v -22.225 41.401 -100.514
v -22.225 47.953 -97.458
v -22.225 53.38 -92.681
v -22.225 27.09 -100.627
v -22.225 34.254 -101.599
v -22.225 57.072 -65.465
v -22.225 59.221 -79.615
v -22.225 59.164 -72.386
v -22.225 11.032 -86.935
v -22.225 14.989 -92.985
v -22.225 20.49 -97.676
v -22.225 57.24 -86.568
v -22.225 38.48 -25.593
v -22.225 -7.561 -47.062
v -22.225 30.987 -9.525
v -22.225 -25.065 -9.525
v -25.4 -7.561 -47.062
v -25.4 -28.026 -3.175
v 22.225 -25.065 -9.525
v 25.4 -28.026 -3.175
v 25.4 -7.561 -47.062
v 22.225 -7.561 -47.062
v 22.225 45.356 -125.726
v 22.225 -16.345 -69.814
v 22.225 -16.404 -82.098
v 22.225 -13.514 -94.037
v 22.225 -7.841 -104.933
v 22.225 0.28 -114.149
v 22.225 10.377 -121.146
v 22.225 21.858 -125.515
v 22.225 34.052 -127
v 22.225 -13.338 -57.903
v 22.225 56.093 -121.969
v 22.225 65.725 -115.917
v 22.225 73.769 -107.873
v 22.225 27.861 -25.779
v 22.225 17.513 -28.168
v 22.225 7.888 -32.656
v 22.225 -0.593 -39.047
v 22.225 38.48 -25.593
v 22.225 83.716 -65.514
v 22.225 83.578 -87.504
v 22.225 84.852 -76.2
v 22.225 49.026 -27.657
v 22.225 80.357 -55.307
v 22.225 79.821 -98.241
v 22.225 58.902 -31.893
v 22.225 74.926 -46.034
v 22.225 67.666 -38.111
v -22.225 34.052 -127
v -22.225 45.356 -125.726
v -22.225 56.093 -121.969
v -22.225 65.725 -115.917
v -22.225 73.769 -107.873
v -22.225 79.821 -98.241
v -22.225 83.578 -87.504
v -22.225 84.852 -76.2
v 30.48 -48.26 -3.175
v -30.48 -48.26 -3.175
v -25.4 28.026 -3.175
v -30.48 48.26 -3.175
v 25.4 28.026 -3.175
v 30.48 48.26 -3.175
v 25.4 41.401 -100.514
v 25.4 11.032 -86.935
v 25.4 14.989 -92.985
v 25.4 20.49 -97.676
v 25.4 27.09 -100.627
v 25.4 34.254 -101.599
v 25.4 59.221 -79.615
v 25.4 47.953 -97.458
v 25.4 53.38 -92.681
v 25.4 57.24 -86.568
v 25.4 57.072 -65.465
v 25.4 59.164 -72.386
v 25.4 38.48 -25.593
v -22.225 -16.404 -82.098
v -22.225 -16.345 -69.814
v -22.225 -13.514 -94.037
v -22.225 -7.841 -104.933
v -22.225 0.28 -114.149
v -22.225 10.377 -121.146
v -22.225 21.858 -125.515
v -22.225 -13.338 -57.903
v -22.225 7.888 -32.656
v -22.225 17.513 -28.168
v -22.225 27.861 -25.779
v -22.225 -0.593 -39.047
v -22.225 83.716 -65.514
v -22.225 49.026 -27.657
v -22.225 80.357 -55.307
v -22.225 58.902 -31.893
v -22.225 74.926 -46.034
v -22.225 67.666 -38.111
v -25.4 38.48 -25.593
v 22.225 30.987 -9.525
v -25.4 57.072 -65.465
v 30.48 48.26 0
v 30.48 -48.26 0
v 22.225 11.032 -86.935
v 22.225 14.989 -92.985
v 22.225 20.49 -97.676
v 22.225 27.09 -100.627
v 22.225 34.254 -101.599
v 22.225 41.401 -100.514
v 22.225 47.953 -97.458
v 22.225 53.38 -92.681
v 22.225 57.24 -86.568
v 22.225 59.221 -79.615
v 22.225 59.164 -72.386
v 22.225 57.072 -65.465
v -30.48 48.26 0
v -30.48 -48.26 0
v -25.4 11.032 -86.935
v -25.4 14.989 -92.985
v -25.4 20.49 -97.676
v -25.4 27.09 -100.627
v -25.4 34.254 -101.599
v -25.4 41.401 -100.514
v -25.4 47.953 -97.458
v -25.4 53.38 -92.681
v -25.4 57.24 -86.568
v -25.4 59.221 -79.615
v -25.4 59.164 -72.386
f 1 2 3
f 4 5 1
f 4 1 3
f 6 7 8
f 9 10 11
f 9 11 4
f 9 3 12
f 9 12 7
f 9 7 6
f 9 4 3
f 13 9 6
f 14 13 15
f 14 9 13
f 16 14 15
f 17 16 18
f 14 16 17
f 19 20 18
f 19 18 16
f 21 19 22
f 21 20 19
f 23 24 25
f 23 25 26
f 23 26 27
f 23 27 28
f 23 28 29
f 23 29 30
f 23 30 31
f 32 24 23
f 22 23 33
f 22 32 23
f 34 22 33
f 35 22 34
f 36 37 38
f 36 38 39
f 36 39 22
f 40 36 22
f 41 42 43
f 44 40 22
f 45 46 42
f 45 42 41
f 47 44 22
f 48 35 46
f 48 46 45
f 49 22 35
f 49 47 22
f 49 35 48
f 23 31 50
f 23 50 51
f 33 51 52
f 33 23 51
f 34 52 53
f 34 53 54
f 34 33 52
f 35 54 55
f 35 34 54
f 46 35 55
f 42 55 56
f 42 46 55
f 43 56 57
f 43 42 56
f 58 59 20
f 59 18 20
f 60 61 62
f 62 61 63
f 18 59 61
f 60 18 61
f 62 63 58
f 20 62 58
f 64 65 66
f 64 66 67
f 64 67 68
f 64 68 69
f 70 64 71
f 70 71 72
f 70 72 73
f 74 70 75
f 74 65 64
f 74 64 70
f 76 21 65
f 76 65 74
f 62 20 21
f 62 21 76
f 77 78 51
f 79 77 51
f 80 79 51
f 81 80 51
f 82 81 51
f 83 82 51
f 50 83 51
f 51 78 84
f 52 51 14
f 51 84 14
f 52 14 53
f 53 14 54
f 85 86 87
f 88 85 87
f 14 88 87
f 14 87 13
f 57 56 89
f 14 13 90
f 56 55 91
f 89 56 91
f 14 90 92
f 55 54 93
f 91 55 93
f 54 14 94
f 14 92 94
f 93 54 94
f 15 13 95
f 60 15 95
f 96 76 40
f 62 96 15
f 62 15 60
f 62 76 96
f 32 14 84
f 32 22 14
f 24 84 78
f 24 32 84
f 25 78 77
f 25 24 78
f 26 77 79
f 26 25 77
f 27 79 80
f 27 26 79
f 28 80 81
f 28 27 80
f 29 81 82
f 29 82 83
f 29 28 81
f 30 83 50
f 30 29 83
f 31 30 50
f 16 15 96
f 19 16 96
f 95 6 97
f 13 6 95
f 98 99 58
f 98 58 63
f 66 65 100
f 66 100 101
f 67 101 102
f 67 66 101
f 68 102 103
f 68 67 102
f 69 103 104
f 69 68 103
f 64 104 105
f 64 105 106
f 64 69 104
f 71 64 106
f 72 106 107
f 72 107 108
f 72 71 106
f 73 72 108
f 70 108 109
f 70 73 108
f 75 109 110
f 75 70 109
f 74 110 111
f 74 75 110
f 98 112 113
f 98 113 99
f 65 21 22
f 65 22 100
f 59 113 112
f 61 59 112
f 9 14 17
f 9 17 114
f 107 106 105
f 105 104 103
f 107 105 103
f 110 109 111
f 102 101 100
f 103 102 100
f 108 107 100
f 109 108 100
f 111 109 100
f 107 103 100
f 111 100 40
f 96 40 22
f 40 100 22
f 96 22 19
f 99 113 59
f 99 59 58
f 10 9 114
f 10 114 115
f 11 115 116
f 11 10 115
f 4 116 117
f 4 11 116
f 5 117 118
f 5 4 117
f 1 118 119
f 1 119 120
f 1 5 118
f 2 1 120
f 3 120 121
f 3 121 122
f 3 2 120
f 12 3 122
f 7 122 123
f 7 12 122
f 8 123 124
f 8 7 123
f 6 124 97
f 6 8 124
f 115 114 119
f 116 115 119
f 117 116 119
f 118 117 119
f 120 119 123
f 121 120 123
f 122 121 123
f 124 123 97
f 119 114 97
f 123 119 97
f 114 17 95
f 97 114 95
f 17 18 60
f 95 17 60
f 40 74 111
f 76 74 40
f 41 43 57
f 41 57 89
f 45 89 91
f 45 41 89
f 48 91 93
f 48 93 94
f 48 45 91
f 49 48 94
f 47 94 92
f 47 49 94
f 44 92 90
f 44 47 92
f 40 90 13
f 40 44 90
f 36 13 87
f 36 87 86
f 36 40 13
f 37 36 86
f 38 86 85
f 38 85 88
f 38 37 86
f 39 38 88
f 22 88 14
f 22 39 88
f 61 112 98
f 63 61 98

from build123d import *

# Parameters (mm, degrees)
F0_W     = 60.96
F0_H     = 96.52
F1_DEPTH = 3.175
F3_DEPTH = 25.4
F4_W     = 44.45
F4_H     = 101.6
F5_DEPTH = 107.713117
F6_DEPTH = 22.225


with BuildPart() as f1:
    # F0 (on Top) → F1 (new body)
    with BuildSketch(Plane.XY):
        Rectangle(F0_W, F0_H)
    extrude(amount=-F1_DEPTH)

    # F2 (on Right) → F3 (join, symmetric)
    with BuildSketch(Plane.YZ):
        with BuildLine():
            Line((-28.025799, -3.175), (-7.560807, -47.062317))
            ThreePointArc((-7.560807, -47.062317), (12.583109, -30.159564), (38.479628, -25.593309))
            Line((38.479628, -25.593309), (28.025799, -3.175))
            Line((28.025799, -3.175), (-28.025799, -3.175))
        make_face()
        with BuildLine():
            ThreePointArc((38.479628, -25.593309), (12.583109, -30.159564), (-7.560807, -47.062317))
            Line((-7.560807, -47.062317), (11.031899, -86.934504))
            ThreePointArc((11.031899, -86.934504), (44.786621, -99.220218), (57.072335, -65.465496))
            Line((57.072335, -65.465496), (38.479628, -25.593309))
        make_face()
    extrude(amount=F3_DEPTH, both=True)

    # F4 (on face) → F5 (cut, through all)
    with BuildSketch(Plane.XZ.offset(48.26)):
        with Locations((0, -60.325)):
            Rectangle(F4_W, F4_H)
    extrude(amount=-F5_DEPTH, mode=Mode.SUBTRACT)


with BuildPart() as f6:
    # F2 (on Right) → F6 (new body, symmetric)
    with BuildSketch(Plane.YZ):
        with BuildLine():
            ThreePointArc((-7.560807, -47.062317), (-11.008034, -99.65683), (34.052117, -127))
            ThreePointArc((34.052117, -127), (69.973141, -112.121024), (84.852117, -76.2))
            ThreePointArc((84.852117, -76.2), (71.505805, -41.880017), (38.479628, -25.593309))
            Line((38.479628, -25.593309), (57.072335, -65.465496))
            ThreePointArc((57.072335, -65.465496), (44.786621, -99.220218), (11.031899, -86.934504))
            Line((11.031899, -86.934504), (-7.560807, -47.062317))
        make_face()
        with BuildLine():
            ThreePointArc((38.479628, -25.593309), (12.583109, -30.159564), (-7.560807, -47.062317))
            Line((-7.560807, -47.062317), (11.031899, -86.934504))
            ThreePointArc((11.031899, -86.934504), (44.786621, -99.220218), (57.072335, -65.465496))
            Line((57.072335, -65.465496), (38.479628, -25.593309))
        make_face()
    extrude(amount=F6_DEPTH, both=True)


solid = Compound([f1.part, f6.part])
